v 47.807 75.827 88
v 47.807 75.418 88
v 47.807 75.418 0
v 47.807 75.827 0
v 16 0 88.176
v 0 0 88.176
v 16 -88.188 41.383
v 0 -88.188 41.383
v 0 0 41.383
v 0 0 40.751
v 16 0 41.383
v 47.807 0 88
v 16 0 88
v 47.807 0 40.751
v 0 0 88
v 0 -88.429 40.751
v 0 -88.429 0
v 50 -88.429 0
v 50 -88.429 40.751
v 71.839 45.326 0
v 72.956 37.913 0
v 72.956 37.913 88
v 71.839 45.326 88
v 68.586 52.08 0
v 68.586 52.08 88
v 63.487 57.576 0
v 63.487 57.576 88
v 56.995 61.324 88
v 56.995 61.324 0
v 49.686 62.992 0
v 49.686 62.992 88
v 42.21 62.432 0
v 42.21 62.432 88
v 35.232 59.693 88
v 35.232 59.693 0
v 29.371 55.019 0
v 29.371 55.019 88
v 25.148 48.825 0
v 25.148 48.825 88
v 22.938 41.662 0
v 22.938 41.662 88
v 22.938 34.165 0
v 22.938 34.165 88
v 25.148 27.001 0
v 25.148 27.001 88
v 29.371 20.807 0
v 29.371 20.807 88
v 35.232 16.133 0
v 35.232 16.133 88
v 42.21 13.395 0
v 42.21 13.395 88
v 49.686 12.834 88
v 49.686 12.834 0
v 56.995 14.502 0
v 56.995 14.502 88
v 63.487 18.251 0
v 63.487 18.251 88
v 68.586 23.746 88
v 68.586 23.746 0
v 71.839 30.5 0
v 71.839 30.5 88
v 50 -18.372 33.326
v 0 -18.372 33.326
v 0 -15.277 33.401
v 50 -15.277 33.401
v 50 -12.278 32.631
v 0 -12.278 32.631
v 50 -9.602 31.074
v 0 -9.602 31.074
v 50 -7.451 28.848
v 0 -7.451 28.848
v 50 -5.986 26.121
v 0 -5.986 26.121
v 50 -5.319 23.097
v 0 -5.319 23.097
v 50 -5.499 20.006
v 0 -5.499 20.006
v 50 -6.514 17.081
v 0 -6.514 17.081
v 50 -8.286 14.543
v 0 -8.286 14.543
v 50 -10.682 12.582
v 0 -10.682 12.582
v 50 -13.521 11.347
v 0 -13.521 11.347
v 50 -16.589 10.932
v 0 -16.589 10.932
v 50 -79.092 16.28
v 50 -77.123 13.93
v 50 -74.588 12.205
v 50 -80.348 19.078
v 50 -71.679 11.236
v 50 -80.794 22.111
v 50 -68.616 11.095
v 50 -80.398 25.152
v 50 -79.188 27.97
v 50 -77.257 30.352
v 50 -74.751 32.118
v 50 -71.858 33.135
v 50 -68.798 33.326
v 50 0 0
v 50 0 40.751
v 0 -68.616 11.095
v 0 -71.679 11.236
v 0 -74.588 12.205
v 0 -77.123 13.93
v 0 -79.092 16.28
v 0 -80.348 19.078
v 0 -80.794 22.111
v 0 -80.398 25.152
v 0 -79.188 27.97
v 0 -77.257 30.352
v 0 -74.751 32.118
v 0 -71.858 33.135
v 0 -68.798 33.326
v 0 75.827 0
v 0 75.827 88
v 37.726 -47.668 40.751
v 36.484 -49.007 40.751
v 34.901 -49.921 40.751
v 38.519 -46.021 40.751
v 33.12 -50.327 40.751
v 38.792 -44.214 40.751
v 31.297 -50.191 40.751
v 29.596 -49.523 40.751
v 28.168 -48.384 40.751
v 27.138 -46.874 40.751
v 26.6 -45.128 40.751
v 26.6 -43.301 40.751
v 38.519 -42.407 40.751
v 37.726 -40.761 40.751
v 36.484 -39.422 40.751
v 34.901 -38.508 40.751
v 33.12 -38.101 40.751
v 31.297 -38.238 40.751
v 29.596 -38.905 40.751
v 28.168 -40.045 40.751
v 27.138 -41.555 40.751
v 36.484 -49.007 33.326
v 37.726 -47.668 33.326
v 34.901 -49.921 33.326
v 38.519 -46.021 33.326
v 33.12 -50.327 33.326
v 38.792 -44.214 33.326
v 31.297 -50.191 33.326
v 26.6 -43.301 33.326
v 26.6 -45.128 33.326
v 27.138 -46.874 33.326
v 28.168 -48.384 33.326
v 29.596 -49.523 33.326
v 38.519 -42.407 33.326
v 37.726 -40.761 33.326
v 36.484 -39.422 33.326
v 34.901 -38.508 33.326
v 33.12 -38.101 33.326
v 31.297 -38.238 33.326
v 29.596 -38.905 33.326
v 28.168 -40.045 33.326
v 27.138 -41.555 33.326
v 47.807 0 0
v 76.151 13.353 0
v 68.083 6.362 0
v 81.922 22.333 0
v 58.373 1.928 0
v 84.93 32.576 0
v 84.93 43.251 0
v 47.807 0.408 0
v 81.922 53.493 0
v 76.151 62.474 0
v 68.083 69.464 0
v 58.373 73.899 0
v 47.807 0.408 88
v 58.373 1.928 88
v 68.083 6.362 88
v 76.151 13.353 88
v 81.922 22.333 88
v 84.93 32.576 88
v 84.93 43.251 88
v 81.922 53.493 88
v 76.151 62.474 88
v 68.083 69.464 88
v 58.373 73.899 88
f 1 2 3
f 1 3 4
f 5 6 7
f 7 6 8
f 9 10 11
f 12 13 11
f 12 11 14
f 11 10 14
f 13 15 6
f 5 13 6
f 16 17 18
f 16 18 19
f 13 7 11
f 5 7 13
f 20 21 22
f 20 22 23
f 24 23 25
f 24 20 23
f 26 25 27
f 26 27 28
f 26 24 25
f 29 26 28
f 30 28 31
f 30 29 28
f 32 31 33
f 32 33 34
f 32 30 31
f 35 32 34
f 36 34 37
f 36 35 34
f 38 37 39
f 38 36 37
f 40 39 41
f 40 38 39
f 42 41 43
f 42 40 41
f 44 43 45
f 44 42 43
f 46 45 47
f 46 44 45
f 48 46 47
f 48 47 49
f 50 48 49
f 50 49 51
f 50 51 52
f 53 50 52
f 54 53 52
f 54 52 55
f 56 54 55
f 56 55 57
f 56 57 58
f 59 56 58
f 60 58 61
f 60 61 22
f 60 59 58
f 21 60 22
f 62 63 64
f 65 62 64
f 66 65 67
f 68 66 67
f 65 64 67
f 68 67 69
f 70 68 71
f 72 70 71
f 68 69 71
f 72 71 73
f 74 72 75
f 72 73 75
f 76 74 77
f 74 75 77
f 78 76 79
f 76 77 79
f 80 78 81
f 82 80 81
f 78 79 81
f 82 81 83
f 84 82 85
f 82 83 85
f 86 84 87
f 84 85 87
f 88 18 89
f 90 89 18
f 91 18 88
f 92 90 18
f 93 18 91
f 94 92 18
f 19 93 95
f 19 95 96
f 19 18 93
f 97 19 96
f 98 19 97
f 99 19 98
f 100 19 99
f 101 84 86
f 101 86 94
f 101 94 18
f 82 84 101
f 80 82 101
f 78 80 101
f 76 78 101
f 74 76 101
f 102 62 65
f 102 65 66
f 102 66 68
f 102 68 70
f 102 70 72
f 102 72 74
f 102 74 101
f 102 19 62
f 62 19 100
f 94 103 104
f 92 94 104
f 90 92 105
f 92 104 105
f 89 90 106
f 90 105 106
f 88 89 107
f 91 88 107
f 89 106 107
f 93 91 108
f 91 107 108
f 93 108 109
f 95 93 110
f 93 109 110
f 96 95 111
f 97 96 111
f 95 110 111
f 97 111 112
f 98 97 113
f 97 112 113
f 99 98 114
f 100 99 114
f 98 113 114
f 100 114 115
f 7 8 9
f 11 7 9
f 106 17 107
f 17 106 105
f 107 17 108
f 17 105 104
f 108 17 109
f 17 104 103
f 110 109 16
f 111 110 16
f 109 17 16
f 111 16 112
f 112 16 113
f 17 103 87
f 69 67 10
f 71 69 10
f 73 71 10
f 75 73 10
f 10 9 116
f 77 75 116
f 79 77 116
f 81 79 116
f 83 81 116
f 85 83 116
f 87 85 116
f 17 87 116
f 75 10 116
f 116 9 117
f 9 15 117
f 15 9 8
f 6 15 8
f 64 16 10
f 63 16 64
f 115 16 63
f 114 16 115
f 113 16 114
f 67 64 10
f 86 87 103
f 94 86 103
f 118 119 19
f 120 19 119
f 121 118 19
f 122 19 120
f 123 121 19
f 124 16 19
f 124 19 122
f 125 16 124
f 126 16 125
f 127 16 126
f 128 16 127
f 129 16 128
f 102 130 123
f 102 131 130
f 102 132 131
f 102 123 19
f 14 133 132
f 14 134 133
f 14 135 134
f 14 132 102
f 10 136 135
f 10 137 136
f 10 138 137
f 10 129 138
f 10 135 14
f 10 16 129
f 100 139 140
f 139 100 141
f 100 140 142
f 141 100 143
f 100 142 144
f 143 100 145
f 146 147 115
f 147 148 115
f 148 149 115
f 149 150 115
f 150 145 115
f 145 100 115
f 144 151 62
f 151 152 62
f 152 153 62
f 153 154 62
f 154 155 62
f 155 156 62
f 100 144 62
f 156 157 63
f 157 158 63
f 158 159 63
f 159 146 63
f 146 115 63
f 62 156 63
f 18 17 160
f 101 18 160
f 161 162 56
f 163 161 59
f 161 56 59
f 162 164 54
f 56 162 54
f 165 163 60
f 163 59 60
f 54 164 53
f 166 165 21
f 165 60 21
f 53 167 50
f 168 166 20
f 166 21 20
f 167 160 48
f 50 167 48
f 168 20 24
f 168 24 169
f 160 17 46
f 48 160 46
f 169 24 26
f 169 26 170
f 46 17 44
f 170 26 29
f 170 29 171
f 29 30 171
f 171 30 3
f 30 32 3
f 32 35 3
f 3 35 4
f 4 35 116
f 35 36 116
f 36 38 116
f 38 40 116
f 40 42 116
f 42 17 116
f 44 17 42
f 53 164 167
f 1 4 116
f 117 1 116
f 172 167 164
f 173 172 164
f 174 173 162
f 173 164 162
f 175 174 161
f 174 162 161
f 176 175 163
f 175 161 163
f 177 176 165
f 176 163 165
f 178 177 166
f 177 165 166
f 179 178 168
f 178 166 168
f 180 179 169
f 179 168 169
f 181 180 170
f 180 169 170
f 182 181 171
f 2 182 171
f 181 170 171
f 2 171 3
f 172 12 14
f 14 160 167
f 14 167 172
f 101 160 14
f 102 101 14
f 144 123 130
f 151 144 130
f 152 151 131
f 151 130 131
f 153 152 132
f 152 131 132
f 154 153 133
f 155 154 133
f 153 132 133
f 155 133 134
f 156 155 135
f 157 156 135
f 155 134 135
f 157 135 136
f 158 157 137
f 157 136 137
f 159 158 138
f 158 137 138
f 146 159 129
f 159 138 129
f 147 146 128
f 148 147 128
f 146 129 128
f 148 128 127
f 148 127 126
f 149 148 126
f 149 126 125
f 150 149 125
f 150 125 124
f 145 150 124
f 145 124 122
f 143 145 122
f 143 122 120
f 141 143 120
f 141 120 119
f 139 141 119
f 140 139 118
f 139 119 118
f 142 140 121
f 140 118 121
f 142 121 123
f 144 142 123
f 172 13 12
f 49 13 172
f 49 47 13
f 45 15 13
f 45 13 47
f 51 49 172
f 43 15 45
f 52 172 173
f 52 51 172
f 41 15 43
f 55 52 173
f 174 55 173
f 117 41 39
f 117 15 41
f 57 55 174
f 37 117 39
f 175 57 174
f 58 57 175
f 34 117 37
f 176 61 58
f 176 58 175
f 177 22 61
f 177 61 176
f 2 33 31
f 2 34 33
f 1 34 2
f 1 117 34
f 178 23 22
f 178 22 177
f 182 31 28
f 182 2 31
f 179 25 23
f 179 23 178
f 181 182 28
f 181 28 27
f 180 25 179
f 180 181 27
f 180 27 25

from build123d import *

# Parameters (mm, degrees)
F0_R     = 25.149299
F1_DEPTH = 88
F2_W     = 88.428743
F2_H     = 40.751
F3_DEPTH = 50
F5_DEPTH = 16
F6_R     = 6.130245
F7_DEPTH = 7.424758


with BuildPart() as f1:
    # F0 (on Top) → F1 (new body)
    with BuildSketch(Plane.XY):
        with BuildLine():
            Line((0, 75.826563), (0, 0))
            Line((0, 0), (47.806516, 0))
            Line((47.806516, 0), (47.806516, 0.408337))
            ThreePointArc((47.806516, 0.408337), (85.31146, 37.913281), (47.806516, 75.418226))
            Line((47.806516, 75.418226), (47.806516, 75.826563))
            Line((47.806516, 75.826563), (0, 75.826563))
        make_face()
        with Locations((47.806516, 37.913281)):
            Circle(F0_R, mode=Mode.SUBTRACT)
    extrude(amount=F1_DEPTH)

    # F2 (on Right) → F3 (join)
    with BuildSketch(Plane.YZ):
        with Locations((-44.214371, 20.3755)):
            Rectangle(F2_W, F2_H)
        with BuildLine():
            ThreePointArc((-18.372269, 33.326242), (-5.31868, 23.097255), (-16.589452, 10.93181))
            Line((-16.589452, 10.93181), (-68.615849, 11.094638))
            ThreePointArc((-68.615849, 11.094638), (-80.794064, 22.111374), (-68.798059, 33.326242))
            Line((-68.798059, 33.326242), (-18.372269, 33.326242))
        make_face(mode=Mode.SUBTRACT)
    extrude(amount=F3_DEPTH)

    # F4 (on Right) → F5 (join)
    with BuildSketch(Plane.YZ):
        Polygon((-88.187516, 41.383404), (0, 41.383404), (0, 88.175647), align=None)
    extrude(amount=F5_DEPTH)

    # F6 (on face) → F7 (cut, through all)
    with BuildSketch(Plane.XY.offset(40.751)):
        with Locations((32.661412, -44.214372)):
            Circle(F6_R)
    extrude(amount=-F7_DEPTH, mode=Mode.SUBTRACT)


solid = f1.part
